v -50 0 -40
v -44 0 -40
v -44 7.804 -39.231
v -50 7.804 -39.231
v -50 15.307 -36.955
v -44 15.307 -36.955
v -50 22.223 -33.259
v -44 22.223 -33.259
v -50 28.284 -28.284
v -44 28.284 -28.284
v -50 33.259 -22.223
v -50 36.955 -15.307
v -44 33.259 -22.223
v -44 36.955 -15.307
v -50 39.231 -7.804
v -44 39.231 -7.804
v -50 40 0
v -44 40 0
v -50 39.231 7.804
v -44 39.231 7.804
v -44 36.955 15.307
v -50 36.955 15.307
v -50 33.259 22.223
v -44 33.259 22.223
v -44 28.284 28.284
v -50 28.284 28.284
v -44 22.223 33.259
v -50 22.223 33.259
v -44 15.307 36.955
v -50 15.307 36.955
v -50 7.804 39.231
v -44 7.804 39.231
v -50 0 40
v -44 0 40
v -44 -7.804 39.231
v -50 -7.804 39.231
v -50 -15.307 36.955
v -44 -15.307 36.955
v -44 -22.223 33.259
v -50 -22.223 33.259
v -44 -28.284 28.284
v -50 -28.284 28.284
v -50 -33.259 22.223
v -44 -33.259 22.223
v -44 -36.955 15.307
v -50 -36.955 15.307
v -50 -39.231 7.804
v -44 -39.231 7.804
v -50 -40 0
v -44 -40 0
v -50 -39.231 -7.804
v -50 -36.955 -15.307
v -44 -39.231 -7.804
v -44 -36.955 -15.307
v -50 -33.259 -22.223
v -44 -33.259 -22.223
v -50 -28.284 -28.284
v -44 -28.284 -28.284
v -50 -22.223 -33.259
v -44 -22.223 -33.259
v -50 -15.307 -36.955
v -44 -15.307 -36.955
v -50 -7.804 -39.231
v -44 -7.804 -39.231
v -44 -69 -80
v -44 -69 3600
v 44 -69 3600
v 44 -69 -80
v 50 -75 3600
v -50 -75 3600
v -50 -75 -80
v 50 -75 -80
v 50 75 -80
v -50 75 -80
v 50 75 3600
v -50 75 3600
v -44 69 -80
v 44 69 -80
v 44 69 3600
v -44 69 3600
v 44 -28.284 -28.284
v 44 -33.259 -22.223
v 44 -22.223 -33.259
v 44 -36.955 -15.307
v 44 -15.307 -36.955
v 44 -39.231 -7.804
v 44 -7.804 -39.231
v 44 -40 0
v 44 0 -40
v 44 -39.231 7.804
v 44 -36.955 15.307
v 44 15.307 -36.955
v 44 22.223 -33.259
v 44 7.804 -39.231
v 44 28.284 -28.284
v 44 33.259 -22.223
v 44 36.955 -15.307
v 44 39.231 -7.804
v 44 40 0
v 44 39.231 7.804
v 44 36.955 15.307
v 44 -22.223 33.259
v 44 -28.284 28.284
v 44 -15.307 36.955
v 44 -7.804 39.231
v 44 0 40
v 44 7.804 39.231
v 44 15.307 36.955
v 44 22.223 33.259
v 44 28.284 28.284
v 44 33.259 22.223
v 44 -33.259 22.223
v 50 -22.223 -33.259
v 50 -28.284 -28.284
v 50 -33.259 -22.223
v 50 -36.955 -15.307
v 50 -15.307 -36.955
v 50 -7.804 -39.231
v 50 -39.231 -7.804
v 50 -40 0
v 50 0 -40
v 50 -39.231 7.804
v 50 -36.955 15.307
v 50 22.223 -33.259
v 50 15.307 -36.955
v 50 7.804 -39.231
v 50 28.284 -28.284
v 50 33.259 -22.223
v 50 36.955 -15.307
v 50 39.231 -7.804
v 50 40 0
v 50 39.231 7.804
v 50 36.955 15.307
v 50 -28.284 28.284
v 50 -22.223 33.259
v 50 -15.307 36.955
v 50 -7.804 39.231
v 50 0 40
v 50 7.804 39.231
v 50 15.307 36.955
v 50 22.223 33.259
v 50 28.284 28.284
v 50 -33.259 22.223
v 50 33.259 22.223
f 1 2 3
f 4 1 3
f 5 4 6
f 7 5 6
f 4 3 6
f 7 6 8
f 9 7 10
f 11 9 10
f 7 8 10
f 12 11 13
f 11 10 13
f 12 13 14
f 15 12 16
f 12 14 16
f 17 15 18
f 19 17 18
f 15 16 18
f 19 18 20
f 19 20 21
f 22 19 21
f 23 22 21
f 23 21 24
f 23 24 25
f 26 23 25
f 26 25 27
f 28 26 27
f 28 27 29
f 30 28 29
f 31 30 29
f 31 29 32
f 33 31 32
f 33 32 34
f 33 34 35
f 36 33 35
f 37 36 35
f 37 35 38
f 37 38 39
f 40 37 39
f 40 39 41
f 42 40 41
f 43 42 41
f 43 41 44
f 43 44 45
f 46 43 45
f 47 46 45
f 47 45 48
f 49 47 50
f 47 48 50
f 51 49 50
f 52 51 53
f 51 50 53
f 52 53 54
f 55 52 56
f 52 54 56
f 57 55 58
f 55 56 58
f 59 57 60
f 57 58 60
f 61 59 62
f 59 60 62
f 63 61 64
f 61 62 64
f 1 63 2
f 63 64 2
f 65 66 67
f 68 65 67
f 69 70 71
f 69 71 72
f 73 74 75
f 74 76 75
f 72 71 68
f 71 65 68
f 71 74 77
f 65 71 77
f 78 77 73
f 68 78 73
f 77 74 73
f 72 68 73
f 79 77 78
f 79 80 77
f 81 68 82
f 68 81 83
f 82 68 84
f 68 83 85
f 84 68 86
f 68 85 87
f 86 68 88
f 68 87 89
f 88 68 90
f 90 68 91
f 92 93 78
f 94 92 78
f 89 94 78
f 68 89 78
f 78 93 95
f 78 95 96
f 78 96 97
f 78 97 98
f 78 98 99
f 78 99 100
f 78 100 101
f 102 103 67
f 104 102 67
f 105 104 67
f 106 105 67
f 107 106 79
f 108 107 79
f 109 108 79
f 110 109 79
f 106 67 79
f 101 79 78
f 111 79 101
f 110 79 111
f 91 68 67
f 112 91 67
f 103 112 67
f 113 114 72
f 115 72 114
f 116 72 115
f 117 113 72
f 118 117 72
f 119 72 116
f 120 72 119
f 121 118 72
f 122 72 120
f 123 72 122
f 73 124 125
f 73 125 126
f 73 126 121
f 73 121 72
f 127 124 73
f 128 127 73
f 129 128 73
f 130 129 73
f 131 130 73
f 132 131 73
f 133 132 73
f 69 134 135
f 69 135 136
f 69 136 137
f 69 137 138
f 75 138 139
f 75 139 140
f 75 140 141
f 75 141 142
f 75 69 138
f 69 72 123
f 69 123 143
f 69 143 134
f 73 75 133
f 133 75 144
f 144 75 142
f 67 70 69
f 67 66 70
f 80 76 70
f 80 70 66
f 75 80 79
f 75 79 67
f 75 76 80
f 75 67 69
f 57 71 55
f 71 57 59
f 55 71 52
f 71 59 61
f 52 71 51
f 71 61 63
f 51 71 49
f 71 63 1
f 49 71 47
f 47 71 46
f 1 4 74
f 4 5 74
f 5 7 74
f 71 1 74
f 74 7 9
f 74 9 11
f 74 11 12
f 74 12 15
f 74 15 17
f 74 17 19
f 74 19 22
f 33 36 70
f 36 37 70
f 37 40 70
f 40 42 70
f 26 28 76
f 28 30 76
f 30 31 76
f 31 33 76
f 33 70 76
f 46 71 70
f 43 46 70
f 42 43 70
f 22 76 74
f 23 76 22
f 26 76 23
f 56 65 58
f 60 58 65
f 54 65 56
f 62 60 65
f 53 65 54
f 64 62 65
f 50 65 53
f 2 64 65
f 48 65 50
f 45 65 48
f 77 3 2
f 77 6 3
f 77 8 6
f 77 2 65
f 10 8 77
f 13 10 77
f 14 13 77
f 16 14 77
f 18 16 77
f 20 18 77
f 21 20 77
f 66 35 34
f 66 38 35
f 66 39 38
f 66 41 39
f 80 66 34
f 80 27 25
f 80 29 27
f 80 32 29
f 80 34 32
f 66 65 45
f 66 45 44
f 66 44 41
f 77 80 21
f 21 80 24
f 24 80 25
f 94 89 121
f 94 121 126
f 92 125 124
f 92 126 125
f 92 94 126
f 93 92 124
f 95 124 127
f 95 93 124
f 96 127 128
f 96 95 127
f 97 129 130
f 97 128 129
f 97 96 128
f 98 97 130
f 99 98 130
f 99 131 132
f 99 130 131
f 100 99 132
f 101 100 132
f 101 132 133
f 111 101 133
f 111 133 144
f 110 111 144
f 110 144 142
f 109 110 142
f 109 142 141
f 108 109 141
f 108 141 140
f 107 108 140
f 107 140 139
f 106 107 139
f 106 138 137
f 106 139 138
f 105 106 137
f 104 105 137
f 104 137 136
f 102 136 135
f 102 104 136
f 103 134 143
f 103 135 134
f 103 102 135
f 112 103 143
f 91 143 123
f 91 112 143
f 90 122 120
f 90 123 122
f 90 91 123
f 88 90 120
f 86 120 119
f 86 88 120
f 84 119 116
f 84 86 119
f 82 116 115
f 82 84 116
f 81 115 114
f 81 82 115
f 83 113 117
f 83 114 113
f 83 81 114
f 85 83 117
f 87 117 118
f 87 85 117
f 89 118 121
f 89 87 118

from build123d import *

# Parameters (mm, degrees)
SKETCH1_W                = 100
SKETCH1_H                = 150
SKETCH1_W_2              = 88
SKETCH1_H_2              = 138
BOSS_EXTRUDE1_DEPTH      = 3600
BOSS_EXTRUDE1_DEPTH_BACK = 80
SKETCH2_R                = 40
CUT_EXTRUDE1_DEPTH       = 51
CUT_EXTRUDE1_DEPTH_BACK  = 51


with BuildPart() as part:
    # Sketch1 → Boss-Extrude1 (new body, two sides)
    with BuildSketch(Plane.XY) as boss_extrude1_sk:
        Rectangle(SKETCH1_W, SKETCH1_H)
        Rectangle(SKETCH1_W_2, SKETCH1_H_2, mode=Mode.SUBTRACT)
    extrude(amount=BOSS_EXTRUDE1_DEPTH)
    extrude(boss_extrude1_sk.sketch, amount=-BOSS_EXTRUDE1_DEPTH_BACK)

    # Sketch2 → Cut-Extrude1 (cut, two sides)
    with BuildSketch(Plane(origin=(0, 0, 0), x_dir=(0, 0, -1), z_dir=(1, 0, 0))) as cut_extrude1_sk:
        Circle(SKETCH2_R)
    extrude(amount=CUT_EXTRUDE1_DEPTH, mode=Mode.SUBTRACT)
    extrude(cut_extrude1_sk.sketch, amount=-CUT_EXTRUDE1_DEPTH_BACK, mode=Mode.SUBTRACT)


solid = part.part
